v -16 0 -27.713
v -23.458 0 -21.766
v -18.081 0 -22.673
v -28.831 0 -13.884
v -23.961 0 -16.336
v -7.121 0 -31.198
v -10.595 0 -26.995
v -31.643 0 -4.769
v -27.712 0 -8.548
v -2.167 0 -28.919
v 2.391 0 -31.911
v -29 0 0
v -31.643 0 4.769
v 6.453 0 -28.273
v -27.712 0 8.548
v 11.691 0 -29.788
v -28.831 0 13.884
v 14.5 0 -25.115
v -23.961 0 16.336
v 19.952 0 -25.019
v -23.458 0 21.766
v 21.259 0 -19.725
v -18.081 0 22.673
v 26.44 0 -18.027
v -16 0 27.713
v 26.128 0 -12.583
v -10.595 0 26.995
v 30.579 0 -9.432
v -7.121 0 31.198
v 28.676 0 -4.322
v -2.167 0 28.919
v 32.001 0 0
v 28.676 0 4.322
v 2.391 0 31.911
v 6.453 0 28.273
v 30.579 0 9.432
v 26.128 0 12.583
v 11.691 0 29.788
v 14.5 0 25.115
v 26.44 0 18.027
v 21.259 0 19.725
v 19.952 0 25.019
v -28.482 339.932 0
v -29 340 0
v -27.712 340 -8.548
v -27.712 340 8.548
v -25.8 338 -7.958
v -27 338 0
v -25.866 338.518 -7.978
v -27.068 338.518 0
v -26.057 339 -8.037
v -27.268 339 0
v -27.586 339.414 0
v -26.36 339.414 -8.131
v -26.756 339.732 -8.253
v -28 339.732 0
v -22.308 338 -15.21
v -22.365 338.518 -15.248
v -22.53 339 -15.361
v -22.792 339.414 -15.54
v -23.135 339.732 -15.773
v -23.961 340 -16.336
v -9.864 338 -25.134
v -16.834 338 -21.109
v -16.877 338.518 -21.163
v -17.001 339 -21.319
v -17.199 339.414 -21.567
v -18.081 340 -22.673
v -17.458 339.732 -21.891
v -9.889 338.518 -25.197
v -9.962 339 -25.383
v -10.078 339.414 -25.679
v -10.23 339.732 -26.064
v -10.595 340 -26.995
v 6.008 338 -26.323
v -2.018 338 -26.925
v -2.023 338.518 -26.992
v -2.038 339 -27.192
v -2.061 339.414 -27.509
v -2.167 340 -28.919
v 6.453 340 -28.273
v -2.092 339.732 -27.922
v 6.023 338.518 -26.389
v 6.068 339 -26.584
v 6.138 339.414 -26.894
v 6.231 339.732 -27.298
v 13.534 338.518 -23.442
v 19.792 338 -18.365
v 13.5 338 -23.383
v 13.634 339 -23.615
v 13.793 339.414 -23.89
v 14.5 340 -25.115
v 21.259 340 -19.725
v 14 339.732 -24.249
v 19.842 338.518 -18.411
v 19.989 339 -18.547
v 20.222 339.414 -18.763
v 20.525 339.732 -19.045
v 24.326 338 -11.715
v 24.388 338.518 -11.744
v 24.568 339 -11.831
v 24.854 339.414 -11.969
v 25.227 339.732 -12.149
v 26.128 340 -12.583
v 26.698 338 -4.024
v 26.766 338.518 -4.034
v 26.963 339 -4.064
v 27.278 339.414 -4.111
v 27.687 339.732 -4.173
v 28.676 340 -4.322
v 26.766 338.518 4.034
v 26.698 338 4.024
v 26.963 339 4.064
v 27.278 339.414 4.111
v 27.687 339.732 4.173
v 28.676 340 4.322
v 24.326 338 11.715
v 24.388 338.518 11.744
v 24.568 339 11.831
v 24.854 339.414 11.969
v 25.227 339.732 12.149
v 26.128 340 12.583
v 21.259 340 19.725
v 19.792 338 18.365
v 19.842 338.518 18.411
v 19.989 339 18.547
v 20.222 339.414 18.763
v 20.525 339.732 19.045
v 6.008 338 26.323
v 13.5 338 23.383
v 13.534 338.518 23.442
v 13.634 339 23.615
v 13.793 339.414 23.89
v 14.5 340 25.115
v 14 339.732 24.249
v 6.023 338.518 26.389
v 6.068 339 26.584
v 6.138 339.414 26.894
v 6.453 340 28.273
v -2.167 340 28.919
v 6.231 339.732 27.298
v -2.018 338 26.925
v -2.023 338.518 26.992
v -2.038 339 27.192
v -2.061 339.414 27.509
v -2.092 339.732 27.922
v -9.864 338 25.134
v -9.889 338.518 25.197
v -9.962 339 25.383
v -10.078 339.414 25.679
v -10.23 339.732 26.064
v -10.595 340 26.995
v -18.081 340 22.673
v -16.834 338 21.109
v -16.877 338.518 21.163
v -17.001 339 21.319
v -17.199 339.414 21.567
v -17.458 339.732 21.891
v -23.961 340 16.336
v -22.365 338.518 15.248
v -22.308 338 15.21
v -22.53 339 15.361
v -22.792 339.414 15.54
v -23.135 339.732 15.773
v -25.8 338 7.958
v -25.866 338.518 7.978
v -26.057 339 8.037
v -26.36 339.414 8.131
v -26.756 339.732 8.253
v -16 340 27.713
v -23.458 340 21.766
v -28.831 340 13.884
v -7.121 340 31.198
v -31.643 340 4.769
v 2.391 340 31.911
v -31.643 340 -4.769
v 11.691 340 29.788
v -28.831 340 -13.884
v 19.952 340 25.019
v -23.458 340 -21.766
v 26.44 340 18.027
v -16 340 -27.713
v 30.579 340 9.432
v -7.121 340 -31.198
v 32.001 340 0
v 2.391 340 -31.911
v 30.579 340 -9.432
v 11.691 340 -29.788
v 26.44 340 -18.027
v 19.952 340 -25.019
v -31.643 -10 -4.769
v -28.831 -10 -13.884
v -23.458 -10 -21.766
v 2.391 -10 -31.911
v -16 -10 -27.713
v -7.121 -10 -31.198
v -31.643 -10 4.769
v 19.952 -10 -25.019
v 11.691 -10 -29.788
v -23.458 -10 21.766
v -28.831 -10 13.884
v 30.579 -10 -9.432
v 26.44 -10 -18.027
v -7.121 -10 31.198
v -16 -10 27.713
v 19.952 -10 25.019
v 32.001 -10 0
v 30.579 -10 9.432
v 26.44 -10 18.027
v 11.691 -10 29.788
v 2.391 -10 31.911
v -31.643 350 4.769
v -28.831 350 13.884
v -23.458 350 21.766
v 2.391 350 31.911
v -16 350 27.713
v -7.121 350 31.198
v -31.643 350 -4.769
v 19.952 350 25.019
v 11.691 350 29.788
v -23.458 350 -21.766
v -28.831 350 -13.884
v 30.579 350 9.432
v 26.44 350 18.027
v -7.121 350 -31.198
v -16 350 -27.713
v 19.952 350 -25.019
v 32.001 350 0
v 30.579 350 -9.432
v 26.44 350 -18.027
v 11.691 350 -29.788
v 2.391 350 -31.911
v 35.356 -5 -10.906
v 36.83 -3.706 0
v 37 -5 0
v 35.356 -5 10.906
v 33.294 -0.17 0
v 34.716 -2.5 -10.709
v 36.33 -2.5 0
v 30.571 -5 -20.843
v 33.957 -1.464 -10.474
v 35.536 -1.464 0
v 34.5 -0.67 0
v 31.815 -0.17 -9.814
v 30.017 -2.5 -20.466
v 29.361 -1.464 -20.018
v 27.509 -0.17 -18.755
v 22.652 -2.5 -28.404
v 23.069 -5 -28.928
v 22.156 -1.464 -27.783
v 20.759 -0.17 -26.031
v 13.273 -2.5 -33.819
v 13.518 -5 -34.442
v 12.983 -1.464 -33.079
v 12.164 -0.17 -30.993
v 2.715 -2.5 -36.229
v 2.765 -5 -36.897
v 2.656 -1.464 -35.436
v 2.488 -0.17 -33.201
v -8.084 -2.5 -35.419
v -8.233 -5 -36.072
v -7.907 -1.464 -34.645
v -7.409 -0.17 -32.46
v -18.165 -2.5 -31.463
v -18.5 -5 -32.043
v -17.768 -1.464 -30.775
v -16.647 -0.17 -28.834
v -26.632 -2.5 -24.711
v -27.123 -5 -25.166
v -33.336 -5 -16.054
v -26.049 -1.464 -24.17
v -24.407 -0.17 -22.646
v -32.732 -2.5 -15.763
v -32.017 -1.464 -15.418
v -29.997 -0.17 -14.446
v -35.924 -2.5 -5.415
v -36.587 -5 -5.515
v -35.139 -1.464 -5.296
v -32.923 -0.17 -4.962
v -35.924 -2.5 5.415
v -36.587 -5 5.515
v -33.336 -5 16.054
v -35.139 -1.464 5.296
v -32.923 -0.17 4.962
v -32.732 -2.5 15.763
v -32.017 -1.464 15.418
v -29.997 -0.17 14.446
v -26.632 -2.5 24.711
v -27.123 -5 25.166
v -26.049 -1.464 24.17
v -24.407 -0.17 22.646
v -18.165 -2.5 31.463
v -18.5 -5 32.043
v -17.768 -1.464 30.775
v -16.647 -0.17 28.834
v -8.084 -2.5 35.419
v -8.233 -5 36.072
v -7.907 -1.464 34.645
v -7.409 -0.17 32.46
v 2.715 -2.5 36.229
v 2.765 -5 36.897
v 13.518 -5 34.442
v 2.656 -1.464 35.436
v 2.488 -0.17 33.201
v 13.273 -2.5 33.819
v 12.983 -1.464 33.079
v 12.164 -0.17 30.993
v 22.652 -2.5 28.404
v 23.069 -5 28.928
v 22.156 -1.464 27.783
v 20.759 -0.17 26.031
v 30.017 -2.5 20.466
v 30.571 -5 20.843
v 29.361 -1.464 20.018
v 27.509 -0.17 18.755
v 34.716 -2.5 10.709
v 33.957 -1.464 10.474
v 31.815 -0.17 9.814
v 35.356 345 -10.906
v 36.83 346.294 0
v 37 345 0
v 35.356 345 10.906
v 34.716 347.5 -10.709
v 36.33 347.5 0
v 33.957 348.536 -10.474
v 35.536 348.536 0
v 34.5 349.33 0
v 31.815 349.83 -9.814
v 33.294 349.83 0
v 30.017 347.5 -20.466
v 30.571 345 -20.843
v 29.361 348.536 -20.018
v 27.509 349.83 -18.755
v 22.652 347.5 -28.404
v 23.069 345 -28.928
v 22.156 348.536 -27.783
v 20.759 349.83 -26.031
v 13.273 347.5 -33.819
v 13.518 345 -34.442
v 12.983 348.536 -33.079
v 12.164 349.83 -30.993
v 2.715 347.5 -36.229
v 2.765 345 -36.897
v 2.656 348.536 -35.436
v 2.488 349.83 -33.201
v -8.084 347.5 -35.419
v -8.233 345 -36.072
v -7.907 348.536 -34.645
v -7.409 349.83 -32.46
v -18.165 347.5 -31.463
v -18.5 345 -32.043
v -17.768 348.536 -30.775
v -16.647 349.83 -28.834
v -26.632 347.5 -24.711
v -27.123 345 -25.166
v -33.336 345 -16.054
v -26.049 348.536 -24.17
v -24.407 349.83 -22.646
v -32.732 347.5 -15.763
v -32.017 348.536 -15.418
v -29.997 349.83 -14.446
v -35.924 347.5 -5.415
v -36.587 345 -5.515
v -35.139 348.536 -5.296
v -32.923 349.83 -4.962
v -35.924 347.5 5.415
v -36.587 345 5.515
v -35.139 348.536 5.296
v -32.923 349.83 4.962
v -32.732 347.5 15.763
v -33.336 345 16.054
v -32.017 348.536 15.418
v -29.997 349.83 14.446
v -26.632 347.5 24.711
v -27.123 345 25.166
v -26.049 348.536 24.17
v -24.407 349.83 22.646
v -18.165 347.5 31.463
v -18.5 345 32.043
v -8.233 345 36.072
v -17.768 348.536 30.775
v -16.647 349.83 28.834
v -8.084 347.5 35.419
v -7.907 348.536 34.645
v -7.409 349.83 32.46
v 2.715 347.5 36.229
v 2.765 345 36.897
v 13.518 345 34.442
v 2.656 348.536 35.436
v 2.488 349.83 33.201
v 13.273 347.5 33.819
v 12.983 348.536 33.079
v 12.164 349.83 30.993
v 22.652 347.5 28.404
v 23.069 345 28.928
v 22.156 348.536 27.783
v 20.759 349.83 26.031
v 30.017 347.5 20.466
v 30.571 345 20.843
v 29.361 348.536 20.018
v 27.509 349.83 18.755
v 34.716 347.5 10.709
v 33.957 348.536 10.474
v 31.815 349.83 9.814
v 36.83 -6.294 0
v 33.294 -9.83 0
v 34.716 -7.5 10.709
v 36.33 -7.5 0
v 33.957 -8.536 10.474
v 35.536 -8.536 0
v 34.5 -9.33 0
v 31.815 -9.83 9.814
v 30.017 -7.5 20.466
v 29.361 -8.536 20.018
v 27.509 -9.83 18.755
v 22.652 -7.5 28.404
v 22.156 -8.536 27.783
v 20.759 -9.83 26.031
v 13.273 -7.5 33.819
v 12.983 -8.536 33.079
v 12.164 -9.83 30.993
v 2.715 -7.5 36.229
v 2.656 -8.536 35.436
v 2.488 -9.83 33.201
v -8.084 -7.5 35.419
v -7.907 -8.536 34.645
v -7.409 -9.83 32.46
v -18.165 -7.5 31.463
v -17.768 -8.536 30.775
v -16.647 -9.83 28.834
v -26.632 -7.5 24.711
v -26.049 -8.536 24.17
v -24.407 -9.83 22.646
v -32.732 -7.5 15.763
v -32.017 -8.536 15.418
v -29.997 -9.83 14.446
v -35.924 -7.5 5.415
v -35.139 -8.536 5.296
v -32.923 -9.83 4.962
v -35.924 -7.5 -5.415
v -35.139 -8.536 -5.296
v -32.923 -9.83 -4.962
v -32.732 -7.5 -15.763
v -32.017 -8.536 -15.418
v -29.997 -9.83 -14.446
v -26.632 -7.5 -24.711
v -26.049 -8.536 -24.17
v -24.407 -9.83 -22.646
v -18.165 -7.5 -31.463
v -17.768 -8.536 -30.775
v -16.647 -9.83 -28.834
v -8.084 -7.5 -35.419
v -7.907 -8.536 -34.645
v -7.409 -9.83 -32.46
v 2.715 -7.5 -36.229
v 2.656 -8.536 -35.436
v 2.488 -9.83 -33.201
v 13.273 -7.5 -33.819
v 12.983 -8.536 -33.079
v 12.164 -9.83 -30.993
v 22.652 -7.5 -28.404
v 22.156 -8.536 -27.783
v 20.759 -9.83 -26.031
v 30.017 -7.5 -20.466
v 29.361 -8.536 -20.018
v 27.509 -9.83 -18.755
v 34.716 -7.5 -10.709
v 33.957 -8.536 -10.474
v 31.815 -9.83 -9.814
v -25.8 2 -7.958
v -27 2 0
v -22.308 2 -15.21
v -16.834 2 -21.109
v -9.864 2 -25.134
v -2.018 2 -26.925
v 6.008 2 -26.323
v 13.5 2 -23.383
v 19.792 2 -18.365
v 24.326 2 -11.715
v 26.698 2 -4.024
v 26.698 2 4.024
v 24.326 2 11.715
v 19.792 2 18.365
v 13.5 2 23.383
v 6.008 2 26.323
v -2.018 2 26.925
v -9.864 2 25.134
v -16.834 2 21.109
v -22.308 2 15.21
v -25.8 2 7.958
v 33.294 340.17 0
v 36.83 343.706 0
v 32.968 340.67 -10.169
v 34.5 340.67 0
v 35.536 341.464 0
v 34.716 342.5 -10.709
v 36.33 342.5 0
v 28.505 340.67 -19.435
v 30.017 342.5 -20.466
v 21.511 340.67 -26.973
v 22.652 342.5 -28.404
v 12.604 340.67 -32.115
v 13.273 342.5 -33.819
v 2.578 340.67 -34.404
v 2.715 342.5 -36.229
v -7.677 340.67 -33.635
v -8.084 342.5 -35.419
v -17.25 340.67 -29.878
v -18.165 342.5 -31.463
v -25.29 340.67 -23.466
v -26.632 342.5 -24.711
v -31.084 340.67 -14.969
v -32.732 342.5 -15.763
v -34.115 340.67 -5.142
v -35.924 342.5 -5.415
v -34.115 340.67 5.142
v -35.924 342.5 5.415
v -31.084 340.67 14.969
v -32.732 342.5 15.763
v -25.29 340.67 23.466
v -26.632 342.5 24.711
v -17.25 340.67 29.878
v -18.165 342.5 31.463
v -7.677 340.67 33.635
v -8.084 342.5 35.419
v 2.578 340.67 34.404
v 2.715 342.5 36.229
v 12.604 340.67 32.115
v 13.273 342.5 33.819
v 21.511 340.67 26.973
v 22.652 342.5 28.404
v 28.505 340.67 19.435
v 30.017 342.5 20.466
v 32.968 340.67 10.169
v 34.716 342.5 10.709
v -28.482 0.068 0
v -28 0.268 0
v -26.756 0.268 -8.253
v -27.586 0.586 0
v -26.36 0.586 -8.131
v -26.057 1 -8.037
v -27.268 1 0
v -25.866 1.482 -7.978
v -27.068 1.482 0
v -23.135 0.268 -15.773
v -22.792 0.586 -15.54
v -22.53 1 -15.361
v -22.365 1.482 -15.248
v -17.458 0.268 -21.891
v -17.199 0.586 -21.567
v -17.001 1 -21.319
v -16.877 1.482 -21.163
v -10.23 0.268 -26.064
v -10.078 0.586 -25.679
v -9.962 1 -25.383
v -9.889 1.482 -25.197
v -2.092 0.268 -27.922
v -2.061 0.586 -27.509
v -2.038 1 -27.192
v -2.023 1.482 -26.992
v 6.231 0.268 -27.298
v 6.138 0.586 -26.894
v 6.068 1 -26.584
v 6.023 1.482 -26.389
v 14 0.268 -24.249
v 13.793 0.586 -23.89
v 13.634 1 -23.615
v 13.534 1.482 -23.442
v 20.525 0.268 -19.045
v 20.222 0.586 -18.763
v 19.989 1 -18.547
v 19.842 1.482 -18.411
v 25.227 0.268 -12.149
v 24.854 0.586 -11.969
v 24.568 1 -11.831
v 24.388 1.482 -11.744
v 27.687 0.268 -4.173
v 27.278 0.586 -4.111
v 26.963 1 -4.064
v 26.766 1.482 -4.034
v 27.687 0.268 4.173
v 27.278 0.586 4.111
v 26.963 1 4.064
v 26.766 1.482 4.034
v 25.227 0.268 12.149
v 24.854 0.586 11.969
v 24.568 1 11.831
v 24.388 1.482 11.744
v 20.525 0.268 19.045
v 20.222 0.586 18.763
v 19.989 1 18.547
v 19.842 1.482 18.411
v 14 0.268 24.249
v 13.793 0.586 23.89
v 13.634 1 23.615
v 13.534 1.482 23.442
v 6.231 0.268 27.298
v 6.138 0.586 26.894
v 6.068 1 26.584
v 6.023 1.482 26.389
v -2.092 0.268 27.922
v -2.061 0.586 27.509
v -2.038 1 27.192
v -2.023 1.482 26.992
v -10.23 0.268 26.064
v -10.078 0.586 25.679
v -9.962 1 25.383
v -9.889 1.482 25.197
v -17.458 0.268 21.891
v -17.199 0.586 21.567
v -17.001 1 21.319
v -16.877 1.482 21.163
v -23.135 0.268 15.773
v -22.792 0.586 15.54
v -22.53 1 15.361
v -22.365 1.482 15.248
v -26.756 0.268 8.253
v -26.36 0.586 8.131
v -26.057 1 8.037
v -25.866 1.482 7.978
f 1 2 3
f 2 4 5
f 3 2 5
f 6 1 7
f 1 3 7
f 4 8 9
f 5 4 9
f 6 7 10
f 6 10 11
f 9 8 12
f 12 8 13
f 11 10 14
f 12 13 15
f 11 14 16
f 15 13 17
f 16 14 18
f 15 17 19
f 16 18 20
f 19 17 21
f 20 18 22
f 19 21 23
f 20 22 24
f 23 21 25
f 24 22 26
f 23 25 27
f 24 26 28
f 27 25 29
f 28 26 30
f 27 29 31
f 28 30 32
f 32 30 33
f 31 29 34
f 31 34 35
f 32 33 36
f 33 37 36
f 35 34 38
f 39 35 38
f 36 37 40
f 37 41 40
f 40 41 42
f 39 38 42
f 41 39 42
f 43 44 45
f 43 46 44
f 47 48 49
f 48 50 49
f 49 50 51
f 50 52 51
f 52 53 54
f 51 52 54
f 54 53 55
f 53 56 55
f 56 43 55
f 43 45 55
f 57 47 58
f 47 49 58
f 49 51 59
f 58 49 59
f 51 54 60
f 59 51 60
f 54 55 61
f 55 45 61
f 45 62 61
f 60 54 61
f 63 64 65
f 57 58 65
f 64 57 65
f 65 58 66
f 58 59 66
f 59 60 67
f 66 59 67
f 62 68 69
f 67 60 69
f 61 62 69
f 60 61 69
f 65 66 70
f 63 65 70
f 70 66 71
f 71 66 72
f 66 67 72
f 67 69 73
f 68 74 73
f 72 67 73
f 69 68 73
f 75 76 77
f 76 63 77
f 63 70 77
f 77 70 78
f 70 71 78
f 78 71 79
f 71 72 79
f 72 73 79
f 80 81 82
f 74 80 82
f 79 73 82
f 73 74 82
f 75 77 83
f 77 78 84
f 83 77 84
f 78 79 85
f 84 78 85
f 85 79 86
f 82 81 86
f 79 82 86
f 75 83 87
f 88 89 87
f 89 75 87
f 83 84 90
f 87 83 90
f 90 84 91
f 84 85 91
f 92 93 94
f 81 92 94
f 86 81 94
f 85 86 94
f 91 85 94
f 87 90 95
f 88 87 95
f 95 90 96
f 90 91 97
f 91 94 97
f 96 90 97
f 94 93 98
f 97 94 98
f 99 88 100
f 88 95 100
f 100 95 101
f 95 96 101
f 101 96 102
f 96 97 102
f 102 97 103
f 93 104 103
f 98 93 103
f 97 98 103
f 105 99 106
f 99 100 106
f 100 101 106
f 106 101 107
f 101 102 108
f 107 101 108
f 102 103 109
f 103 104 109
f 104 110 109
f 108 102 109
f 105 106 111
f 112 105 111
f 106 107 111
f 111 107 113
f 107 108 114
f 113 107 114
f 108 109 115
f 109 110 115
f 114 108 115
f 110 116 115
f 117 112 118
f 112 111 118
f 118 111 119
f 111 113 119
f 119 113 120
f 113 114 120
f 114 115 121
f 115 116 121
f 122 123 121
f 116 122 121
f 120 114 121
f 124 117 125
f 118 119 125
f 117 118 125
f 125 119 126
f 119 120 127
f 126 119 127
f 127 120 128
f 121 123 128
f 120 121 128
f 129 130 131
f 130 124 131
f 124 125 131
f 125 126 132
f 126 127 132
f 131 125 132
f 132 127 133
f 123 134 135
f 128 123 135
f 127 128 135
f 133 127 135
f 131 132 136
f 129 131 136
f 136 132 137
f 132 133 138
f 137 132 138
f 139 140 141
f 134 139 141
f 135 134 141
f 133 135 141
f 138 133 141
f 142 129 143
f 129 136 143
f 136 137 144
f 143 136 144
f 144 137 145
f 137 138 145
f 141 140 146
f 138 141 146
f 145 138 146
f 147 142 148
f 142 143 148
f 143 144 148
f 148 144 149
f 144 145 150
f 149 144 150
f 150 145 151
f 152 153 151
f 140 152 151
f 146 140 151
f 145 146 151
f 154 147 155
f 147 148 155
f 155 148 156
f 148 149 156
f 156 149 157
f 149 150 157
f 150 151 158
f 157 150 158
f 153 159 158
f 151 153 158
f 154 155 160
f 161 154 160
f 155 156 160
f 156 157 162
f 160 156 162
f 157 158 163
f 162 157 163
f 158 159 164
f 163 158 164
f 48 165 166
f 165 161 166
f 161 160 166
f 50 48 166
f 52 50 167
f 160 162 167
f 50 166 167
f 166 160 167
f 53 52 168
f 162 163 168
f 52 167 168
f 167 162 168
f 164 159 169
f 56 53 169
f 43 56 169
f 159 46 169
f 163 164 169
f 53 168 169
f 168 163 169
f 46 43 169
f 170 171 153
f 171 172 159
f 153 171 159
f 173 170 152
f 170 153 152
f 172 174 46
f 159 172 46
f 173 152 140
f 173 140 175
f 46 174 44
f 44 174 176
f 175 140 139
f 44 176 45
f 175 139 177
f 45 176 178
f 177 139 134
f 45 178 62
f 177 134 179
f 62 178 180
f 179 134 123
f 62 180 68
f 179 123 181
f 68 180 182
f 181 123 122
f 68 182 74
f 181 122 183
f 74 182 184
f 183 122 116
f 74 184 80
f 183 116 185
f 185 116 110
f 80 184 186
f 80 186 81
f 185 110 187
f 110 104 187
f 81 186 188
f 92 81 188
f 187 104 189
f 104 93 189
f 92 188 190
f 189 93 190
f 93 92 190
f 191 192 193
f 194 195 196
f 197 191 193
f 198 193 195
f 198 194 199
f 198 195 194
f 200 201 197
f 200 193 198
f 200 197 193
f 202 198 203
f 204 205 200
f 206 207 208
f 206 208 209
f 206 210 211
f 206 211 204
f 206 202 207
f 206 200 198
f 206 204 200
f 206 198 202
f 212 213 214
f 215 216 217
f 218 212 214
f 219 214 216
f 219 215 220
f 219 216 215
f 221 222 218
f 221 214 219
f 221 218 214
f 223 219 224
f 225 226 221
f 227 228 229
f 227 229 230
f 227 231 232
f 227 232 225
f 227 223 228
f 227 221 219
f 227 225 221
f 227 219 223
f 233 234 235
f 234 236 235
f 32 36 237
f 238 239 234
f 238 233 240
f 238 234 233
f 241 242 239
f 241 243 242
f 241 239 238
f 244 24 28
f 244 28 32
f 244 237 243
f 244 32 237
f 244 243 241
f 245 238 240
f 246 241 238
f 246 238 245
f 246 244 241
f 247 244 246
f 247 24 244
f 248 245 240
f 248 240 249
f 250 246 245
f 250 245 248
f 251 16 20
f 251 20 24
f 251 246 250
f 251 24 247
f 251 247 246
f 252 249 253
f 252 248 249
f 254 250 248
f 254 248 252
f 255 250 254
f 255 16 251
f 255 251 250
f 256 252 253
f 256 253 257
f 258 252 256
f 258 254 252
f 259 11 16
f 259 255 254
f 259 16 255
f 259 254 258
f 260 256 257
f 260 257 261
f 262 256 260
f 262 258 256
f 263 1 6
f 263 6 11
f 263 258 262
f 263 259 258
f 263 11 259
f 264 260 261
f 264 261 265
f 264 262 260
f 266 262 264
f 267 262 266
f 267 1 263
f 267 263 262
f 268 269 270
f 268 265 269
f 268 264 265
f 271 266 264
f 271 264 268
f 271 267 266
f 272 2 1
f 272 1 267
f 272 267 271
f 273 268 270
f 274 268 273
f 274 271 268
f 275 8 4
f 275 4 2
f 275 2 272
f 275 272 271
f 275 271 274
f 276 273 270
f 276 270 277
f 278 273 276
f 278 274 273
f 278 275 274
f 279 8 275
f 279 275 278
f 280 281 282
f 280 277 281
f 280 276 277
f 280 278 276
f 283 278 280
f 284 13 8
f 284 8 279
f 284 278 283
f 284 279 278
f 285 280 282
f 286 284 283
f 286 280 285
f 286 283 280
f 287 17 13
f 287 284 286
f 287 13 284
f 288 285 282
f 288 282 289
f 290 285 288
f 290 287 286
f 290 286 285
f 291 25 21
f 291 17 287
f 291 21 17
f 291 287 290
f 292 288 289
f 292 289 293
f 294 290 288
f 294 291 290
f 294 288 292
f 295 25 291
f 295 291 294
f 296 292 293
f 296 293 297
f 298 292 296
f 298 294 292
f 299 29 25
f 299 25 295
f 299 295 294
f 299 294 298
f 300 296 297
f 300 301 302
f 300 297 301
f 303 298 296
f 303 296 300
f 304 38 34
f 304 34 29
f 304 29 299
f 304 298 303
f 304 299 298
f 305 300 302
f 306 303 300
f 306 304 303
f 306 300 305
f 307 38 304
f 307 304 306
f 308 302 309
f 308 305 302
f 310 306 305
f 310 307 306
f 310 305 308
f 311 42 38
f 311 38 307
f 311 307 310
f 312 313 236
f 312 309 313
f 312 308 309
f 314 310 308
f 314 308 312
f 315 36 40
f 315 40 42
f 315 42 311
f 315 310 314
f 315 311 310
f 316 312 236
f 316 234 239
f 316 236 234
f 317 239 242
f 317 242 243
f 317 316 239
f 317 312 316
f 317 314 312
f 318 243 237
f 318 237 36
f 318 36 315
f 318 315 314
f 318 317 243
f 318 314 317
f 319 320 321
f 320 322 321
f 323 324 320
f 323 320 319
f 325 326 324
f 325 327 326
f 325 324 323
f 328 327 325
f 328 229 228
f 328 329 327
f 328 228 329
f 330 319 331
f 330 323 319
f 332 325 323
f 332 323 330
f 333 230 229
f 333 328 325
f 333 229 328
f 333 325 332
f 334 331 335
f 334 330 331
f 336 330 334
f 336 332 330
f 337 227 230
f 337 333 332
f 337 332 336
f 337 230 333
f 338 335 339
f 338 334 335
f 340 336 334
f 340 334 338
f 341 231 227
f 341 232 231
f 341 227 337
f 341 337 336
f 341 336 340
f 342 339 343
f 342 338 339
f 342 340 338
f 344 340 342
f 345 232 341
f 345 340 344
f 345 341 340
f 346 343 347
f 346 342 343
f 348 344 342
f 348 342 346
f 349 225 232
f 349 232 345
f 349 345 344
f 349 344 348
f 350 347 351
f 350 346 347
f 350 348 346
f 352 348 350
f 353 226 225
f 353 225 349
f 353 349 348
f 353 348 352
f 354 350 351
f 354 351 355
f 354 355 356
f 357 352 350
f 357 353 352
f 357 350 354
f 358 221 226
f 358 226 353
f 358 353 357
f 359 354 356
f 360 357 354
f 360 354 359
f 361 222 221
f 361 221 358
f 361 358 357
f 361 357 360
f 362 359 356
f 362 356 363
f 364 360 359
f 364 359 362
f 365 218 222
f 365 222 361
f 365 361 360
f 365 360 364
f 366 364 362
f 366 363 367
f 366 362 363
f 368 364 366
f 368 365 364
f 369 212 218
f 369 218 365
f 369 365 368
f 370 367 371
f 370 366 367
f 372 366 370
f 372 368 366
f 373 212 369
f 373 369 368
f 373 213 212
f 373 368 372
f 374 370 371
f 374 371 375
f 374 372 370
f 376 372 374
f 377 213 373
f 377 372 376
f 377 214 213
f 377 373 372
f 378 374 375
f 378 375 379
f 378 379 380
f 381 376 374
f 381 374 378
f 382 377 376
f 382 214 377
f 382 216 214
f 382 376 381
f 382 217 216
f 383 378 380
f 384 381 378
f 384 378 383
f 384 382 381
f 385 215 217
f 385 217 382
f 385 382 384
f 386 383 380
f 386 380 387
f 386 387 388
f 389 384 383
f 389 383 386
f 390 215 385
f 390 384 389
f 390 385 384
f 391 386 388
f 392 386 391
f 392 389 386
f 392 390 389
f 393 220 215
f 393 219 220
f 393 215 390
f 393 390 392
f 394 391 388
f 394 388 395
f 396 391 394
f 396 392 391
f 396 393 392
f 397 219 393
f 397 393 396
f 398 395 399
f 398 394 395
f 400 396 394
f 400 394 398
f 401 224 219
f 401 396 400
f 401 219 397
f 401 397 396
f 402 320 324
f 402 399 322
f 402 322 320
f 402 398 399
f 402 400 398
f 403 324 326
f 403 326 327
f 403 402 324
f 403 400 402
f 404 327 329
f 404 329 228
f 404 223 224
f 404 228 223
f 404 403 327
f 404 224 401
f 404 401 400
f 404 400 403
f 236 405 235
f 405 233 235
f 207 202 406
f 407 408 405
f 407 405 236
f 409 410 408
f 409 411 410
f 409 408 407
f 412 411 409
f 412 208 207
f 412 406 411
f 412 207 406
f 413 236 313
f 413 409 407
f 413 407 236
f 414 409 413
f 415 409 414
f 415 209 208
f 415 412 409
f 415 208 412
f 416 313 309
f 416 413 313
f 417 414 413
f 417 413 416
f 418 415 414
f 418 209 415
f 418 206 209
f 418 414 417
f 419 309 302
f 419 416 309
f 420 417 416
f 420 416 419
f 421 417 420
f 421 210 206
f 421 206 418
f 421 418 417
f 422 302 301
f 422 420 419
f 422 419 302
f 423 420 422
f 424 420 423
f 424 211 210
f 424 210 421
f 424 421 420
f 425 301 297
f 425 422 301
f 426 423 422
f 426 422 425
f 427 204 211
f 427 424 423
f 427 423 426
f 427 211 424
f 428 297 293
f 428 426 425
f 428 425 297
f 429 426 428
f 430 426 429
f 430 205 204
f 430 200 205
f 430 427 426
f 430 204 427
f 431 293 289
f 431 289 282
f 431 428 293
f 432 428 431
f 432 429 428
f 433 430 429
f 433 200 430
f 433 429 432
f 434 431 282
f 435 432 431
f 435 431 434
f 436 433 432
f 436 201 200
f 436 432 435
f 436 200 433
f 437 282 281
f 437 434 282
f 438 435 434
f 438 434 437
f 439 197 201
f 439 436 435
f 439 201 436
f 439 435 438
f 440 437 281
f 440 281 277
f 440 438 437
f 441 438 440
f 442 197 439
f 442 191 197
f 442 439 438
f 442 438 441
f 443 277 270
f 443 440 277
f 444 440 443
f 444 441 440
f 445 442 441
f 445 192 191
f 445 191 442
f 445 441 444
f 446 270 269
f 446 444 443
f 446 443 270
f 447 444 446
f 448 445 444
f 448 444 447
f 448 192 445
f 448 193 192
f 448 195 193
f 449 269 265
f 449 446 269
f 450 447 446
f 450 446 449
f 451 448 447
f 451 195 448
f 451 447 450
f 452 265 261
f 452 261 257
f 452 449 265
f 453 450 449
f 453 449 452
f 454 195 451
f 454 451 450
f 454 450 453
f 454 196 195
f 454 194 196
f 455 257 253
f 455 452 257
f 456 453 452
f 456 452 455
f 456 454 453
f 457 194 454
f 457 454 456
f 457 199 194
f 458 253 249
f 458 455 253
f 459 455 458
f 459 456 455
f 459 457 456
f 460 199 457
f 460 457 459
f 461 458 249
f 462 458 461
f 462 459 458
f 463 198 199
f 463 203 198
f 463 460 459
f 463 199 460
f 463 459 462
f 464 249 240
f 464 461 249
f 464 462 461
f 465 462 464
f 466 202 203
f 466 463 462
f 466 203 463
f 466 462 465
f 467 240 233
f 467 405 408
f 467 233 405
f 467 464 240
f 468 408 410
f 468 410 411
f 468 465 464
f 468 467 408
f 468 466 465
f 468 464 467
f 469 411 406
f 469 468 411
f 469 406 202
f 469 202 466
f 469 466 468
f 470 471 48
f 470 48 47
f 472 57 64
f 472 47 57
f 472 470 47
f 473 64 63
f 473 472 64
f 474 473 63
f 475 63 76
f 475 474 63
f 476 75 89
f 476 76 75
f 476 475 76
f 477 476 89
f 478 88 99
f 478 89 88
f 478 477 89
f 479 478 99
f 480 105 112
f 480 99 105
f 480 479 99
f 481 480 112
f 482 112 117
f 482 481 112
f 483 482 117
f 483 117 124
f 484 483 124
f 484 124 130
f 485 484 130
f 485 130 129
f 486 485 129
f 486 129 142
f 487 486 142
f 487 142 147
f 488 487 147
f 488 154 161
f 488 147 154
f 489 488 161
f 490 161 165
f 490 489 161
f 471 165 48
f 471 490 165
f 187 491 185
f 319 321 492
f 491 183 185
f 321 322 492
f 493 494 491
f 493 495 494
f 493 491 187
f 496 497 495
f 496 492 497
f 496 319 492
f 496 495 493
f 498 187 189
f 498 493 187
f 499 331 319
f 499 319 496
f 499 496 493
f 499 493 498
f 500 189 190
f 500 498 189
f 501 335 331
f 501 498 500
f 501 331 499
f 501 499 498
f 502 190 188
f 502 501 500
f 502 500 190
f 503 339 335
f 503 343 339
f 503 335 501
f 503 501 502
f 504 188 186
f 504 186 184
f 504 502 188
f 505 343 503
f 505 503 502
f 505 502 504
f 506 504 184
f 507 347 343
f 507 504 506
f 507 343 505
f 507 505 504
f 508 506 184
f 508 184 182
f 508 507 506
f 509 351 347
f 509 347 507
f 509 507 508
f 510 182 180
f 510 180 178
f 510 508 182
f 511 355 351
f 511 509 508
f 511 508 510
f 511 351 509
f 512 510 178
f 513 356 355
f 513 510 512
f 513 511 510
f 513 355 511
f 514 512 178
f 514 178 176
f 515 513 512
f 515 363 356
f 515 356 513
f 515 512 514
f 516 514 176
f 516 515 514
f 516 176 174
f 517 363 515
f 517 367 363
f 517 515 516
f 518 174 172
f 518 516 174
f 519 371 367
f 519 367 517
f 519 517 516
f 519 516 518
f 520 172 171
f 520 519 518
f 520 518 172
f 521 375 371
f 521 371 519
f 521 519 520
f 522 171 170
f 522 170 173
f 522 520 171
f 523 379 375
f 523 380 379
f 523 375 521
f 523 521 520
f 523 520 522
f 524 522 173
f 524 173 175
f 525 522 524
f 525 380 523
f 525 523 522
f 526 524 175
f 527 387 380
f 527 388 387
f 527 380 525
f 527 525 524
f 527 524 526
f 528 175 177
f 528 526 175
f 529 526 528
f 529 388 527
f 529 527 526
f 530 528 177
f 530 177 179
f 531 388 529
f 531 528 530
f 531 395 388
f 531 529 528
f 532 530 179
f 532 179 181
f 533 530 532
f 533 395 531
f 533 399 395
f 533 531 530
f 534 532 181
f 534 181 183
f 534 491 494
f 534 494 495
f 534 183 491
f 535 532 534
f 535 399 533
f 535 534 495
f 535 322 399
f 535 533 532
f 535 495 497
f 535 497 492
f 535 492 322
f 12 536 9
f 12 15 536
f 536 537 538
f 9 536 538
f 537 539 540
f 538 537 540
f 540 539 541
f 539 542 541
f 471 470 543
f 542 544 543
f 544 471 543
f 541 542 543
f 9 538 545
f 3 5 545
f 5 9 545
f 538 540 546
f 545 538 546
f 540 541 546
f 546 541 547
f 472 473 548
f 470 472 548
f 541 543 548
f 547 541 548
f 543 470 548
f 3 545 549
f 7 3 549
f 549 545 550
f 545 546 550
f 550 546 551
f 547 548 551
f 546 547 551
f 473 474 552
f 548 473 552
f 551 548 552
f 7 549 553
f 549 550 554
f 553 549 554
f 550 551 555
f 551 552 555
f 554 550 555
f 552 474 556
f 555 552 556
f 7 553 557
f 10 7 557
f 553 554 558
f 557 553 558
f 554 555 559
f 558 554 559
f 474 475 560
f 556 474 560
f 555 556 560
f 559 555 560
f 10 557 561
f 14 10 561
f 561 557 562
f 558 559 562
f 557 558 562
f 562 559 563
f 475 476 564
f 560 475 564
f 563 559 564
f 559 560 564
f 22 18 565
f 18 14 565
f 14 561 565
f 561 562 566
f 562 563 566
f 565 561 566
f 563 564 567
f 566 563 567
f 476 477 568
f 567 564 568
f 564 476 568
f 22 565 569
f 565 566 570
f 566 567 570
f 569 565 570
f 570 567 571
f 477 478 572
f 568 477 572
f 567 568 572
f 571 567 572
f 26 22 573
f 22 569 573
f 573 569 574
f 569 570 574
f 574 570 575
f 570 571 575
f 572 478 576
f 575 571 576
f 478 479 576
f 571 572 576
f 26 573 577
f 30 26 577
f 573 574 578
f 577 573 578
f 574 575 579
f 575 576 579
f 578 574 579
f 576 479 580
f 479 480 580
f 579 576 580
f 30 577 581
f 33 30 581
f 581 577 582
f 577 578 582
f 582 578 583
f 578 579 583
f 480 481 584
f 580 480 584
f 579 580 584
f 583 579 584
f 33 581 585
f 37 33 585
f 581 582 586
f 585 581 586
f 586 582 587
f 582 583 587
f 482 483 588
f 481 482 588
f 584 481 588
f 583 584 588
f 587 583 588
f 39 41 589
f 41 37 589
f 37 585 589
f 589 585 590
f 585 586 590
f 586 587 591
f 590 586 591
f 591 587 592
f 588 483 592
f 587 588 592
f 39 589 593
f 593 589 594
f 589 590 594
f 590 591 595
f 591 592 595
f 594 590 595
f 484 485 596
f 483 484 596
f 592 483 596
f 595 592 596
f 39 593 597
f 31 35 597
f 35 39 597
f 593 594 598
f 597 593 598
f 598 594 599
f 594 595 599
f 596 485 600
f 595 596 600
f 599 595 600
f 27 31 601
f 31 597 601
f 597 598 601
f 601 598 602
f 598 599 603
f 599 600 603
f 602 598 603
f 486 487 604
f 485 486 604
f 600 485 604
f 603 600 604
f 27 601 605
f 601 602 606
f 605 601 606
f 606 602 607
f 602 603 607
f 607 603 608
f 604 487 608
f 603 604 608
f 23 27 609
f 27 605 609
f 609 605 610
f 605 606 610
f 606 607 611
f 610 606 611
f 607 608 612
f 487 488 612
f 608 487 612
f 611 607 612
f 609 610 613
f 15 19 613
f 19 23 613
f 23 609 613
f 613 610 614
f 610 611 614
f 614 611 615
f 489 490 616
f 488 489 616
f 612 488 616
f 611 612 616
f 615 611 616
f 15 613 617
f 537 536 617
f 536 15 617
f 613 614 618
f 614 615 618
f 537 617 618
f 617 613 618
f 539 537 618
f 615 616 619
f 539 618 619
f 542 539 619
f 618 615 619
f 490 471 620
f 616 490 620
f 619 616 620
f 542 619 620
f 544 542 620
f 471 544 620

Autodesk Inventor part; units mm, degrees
ref_plane "YZ Plane" through (0, 0, 0) normal (1, 0, 0) x (0, 1, 0)
ref_plane "XZ Plane" through (0, 0, 0) normal (0, 1, 0) x (-1, 0, 0)
ref_plane "XY Plane" through (0, 0, 0) normal (0, 0, 1) x (1, 0, 0)
sketch "草图1" plane through (0, 0, 0) normal (0, 1, 0) x (-1, 0, 0)
  circle A0 centre (0, 0) radius 27
  dimension "d0" = 54
extrude "拉伸1" add sketch "草图1" along normal blind 340
sketch "草图2" plane through (0, 340, 0) normal (0, 1, 0) x (1, 0, 0)
  circle A0 centre (0, 0) radius 37
extrude "拉伸2" add sketch "草图2" along normal blind 10
sketch "草图3" plane through (0, 0, 0) normal (0, -1, 0) x (1, 0, 0)
  circle A0 centre (0, 0) radius 37
extrude "拉伸3" add sketch "草图3" along normal blind 10
fillet "圆角1" radius 5 4 edges at (-37, 350, 0) (-37, 340, 0) (-37, 0, 0) (-37, -10, 0)
fillet "圆角2" radius 2 2 edges at (27, 340, 0) (27, 0, 0)
properties part number "销钉" material "钢，高强度，低合金"
